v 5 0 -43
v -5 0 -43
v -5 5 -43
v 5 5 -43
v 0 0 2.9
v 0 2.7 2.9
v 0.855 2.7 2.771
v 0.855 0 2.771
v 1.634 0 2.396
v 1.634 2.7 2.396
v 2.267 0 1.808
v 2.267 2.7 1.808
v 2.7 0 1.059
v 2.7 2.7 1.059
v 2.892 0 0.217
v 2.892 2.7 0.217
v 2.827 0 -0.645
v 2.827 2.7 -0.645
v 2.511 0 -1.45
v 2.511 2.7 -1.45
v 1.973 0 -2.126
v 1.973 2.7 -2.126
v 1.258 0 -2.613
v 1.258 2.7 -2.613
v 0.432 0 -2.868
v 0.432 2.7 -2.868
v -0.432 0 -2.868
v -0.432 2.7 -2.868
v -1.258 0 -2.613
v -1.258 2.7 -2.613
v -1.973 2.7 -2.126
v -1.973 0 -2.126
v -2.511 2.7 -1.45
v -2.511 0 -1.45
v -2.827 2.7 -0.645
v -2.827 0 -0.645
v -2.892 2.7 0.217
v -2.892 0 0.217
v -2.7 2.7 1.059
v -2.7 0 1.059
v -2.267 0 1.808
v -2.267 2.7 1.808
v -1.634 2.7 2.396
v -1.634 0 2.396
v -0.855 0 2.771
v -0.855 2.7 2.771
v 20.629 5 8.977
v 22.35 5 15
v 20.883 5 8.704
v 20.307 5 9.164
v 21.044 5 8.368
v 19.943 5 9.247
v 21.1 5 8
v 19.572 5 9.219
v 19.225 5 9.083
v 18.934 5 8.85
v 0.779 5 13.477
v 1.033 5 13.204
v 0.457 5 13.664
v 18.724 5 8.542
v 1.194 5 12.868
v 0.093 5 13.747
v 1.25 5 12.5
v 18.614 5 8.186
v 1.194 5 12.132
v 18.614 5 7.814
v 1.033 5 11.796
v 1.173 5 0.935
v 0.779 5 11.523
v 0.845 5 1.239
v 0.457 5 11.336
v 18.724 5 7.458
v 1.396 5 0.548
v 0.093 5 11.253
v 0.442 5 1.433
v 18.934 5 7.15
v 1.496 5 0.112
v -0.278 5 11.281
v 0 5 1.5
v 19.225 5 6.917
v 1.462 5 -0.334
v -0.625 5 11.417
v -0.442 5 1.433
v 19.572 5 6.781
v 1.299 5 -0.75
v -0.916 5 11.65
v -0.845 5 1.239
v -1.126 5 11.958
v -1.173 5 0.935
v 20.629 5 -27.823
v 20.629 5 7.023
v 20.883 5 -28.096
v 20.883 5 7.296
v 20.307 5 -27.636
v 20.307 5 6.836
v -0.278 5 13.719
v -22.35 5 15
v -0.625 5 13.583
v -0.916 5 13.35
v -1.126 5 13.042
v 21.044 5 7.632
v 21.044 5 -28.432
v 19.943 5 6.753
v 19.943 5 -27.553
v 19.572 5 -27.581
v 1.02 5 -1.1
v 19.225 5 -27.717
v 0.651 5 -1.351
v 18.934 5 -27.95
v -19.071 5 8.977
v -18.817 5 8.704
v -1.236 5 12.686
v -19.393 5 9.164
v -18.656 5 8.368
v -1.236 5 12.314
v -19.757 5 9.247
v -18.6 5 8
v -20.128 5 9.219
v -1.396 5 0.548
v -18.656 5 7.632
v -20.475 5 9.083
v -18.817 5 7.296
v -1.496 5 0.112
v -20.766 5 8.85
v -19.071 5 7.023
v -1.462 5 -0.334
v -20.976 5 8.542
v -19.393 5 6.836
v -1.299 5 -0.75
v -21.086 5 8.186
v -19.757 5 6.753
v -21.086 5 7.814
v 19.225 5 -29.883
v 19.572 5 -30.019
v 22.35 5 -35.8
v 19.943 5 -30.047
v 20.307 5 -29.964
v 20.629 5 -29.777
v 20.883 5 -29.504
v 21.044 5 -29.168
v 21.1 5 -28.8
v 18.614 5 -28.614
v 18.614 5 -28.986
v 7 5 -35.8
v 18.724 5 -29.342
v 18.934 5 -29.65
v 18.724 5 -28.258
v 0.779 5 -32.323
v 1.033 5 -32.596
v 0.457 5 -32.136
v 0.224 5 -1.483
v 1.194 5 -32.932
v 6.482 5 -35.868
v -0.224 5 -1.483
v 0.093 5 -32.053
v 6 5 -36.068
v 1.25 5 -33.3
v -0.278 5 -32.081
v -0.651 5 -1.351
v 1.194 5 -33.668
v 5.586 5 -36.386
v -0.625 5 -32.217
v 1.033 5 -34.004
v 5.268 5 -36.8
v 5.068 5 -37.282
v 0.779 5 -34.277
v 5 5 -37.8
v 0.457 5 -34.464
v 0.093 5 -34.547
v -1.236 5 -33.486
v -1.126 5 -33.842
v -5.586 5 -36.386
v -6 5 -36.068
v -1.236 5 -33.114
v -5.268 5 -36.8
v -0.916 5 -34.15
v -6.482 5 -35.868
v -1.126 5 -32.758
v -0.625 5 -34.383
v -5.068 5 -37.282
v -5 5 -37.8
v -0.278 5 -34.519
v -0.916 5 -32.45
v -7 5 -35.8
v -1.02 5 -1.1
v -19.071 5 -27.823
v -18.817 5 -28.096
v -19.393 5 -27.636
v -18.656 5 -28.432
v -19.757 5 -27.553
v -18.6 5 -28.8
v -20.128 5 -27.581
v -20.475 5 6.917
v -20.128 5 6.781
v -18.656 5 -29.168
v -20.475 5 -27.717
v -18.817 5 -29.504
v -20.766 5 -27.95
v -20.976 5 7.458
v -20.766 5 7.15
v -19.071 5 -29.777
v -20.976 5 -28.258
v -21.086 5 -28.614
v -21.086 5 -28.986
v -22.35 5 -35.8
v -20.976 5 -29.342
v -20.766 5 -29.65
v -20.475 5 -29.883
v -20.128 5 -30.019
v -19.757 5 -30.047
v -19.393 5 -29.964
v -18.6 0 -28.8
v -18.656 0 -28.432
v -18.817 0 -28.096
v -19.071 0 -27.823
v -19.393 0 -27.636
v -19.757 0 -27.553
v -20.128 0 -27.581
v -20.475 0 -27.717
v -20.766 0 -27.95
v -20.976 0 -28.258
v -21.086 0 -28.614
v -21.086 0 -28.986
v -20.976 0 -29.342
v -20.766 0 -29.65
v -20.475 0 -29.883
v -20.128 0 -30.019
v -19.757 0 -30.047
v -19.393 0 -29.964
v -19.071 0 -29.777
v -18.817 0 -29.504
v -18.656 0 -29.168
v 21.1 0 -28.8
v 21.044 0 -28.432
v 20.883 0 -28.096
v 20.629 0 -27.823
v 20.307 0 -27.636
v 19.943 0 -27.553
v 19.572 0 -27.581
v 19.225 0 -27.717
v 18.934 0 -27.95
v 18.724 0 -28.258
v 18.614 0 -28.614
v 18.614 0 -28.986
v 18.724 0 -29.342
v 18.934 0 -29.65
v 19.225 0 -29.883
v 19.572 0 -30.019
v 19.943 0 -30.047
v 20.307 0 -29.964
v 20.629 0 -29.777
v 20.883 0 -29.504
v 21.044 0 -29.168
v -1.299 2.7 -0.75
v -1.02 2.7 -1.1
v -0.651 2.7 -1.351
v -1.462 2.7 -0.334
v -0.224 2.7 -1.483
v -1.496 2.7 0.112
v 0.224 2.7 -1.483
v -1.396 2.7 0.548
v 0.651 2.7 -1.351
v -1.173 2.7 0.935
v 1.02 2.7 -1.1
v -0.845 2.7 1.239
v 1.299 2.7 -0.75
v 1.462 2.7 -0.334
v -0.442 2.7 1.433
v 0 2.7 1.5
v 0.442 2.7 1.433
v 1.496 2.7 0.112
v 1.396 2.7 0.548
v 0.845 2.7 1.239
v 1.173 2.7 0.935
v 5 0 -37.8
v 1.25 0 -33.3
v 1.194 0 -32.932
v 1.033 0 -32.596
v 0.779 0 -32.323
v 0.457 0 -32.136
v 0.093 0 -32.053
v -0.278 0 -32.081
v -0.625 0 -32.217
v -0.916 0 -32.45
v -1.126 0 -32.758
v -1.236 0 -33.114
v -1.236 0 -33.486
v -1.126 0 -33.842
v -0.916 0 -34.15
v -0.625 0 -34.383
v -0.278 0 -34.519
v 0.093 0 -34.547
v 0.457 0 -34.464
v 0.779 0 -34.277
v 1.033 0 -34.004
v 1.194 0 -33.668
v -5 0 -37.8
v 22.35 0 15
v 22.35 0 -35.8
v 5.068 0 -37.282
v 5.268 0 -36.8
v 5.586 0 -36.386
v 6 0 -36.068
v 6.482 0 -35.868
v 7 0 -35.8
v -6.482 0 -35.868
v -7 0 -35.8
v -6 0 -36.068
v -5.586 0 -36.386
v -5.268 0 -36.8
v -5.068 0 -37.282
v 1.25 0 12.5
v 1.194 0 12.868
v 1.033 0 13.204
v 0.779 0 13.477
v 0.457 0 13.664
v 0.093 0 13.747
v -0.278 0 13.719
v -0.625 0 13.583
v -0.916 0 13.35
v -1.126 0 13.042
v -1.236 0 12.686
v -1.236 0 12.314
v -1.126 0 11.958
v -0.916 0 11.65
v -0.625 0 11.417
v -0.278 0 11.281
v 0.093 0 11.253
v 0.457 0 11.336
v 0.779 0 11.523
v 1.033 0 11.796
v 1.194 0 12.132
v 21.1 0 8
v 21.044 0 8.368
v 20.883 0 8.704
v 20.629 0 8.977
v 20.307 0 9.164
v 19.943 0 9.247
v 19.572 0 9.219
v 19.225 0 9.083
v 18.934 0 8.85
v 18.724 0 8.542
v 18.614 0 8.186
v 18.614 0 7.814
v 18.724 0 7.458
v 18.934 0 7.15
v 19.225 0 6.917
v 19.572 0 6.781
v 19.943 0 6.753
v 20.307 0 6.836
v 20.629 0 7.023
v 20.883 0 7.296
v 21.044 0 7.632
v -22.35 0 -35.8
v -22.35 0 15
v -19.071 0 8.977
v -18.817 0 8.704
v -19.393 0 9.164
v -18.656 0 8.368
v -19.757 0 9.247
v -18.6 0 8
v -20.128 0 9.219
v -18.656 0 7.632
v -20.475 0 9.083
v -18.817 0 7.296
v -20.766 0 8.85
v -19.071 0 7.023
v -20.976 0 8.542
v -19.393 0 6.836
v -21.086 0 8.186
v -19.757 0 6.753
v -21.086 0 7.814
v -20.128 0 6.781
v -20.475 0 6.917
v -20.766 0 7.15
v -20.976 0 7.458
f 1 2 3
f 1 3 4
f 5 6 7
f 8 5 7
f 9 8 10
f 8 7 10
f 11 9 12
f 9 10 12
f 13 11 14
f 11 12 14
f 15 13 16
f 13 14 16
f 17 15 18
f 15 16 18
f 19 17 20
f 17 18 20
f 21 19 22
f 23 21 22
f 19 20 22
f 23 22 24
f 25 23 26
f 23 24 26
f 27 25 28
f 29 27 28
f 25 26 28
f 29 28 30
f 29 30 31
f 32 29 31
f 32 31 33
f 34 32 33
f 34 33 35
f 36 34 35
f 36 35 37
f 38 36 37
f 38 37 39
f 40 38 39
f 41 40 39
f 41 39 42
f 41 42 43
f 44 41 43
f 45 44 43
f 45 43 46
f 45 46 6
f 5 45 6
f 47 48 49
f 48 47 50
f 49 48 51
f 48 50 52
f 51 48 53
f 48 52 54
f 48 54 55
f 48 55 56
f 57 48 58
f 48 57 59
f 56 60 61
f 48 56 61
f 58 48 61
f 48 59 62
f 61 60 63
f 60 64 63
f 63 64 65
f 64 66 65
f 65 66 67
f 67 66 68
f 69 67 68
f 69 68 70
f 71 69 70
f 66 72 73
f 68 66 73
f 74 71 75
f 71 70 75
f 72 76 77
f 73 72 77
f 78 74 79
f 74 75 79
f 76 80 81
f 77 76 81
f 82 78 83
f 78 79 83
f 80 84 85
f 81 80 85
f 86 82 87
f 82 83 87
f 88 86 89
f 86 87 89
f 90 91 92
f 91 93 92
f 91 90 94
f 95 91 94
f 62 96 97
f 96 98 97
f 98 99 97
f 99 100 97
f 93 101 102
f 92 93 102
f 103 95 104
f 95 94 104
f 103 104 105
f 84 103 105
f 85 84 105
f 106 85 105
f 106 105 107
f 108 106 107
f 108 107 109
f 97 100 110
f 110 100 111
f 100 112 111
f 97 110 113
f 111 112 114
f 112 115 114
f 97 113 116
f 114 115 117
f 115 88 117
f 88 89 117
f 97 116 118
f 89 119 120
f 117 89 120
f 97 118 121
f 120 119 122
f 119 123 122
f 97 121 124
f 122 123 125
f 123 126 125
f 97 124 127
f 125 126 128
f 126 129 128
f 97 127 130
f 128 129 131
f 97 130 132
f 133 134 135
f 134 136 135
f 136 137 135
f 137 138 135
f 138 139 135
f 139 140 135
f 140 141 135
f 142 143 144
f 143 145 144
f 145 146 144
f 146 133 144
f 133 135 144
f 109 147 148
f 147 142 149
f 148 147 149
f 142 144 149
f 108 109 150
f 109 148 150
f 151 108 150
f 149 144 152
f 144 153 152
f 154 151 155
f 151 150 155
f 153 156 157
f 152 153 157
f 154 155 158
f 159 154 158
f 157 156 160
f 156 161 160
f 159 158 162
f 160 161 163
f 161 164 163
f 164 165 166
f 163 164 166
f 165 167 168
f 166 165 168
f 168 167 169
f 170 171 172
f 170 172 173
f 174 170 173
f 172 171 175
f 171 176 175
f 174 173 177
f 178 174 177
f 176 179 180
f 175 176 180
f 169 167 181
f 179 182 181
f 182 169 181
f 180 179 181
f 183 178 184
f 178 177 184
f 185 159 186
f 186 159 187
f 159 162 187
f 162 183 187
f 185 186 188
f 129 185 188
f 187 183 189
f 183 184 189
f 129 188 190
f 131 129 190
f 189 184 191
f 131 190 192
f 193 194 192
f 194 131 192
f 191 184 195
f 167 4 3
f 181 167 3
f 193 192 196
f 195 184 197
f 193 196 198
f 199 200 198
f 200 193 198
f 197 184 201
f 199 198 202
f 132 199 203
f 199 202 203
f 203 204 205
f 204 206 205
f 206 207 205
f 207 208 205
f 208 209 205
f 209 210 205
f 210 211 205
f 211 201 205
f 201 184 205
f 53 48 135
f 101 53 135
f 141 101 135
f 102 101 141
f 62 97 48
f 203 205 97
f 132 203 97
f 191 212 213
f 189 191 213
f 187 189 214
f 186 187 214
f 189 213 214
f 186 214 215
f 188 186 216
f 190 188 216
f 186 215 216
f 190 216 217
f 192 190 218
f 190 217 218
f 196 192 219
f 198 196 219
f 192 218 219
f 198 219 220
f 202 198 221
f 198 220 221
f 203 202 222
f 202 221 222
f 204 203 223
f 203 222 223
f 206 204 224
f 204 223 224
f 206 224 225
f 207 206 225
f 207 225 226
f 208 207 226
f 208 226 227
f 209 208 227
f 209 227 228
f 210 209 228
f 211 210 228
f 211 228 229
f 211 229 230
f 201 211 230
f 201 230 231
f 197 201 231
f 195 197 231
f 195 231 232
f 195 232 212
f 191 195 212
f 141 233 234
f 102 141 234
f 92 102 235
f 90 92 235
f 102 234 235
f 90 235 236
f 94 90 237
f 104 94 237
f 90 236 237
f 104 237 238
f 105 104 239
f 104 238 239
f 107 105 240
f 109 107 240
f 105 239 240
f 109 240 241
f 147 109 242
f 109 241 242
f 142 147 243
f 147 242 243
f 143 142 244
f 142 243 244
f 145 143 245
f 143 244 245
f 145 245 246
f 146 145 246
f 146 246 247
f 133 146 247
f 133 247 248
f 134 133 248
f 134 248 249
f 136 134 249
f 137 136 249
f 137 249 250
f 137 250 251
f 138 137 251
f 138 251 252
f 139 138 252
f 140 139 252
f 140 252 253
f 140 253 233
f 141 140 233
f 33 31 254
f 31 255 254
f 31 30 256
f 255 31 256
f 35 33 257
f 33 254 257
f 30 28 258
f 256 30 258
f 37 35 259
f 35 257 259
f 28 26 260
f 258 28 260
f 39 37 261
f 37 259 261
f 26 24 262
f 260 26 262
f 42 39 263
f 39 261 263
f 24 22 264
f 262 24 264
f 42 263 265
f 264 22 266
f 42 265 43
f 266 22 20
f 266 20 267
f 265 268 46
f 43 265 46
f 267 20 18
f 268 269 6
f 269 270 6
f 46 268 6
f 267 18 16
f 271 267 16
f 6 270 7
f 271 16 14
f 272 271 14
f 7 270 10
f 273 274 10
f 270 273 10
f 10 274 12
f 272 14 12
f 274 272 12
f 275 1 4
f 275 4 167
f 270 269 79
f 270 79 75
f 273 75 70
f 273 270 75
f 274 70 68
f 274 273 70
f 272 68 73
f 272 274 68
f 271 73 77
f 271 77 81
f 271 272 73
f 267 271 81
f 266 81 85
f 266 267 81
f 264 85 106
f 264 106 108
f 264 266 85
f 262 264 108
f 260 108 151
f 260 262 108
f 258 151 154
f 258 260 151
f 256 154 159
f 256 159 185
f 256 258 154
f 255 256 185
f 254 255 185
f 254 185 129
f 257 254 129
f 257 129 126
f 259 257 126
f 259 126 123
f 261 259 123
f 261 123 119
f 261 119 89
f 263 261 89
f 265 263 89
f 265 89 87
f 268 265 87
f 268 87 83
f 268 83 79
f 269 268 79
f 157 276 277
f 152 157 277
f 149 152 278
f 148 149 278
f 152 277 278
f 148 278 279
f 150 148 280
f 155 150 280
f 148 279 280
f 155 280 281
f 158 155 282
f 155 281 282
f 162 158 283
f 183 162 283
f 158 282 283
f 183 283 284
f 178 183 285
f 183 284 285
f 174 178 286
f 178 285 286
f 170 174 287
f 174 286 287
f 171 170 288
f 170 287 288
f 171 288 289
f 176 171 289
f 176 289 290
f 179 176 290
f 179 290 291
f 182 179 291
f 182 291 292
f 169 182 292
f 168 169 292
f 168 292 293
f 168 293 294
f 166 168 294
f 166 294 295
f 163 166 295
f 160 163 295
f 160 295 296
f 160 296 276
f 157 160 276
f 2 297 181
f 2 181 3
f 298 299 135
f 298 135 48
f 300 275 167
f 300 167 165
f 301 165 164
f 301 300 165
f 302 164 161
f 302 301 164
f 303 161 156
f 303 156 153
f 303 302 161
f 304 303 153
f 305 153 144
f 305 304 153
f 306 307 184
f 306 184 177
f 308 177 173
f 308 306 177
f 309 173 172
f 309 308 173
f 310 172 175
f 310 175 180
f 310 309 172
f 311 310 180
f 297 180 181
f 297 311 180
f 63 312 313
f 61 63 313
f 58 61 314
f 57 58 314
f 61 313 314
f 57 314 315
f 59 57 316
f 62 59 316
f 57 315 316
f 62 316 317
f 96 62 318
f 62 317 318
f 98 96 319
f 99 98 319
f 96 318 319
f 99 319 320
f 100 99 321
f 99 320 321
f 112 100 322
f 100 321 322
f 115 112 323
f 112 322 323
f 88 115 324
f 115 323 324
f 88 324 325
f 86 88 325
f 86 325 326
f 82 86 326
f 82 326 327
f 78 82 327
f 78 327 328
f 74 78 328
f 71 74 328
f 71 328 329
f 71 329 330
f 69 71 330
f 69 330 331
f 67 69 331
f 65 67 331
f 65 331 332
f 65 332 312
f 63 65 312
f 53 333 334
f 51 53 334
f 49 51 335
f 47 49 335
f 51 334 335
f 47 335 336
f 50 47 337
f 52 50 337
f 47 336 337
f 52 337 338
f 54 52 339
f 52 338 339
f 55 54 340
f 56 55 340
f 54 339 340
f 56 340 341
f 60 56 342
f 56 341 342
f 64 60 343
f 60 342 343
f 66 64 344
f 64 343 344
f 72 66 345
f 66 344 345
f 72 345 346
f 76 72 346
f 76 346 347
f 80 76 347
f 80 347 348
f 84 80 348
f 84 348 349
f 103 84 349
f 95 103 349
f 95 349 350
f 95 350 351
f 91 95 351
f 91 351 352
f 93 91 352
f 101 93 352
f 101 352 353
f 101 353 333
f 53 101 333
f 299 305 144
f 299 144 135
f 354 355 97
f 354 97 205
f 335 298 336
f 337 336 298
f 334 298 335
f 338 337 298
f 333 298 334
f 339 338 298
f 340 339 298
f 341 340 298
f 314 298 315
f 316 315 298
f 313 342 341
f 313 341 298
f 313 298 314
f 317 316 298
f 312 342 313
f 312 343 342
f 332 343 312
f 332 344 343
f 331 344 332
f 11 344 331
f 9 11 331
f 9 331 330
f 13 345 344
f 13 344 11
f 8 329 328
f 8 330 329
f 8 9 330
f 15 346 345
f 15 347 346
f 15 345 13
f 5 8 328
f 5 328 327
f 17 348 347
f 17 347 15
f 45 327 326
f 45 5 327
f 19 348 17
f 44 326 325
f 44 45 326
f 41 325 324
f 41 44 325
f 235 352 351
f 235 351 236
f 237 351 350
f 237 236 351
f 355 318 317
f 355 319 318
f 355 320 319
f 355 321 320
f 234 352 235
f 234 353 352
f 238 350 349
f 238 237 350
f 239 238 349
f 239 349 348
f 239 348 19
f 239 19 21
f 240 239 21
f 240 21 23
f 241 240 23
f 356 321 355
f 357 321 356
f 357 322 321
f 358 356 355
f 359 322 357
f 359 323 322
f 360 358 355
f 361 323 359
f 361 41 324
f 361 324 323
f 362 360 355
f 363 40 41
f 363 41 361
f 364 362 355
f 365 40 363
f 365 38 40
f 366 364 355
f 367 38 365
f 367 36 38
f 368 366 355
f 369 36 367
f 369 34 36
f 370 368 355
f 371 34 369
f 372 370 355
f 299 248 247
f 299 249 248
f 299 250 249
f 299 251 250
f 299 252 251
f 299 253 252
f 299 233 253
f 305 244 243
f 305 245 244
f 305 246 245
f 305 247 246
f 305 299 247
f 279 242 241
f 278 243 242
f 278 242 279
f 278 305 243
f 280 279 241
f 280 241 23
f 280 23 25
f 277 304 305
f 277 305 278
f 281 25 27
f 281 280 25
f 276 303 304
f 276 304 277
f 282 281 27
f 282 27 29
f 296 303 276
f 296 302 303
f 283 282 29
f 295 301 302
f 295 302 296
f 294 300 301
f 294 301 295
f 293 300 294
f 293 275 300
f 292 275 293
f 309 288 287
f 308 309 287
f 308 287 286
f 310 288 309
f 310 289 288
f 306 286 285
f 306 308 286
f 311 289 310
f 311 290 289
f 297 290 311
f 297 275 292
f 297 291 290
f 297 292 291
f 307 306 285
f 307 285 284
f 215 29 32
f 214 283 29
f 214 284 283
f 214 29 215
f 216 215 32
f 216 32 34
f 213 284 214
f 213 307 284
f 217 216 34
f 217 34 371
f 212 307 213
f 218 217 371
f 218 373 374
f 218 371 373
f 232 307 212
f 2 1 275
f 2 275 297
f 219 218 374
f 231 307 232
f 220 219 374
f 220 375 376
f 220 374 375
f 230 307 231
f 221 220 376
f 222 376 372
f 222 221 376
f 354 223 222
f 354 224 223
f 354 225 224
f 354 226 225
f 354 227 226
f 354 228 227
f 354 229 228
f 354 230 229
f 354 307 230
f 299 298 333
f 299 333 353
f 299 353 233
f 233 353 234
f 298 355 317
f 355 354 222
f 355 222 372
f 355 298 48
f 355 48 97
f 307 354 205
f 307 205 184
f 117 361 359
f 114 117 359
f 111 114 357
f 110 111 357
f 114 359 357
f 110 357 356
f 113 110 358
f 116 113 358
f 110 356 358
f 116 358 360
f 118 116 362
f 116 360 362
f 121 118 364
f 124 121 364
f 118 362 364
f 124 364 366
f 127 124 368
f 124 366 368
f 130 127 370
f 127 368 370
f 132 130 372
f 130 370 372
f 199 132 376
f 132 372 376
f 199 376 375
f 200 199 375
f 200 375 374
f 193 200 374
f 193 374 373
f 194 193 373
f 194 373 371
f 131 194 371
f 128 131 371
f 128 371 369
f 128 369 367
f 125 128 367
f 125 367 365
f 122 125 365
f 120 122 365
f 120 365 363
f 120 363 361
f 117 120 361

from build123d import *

# Parameters (mm, degrees)
ESQUISSE1_R             = 1.5
EXTRUSION1_DEPTH        = 5
TROU_TARAUD_M3X0_51_D   = 2.5
ESQUISSE6_R             = 2.9
ENL_V_MAT_EXTRU_3_DEPTH = 49.536712909


with BuildPart() as part:
    # Esquisse1 → Extrusion1 (new body)
    with BuildSketch(Plane(origin=(0, 0, 0), x_dir=(1, 0, 0), z_dir=(0, 1, 0))):
        with BuildLine():
            Line((-22.35, 35.8), (-7, 35.8))
            ThreePointArc((-7, 35.8), (-5.585786438, 36.385786438), (-5, 37.8))
            Line((-5, 37.8), (-5, 43))
            Line((-5, 43), (5, 43))
            Line((5, 43), (5, 37.8))
            ThreePointArc((5, 37.8), (5.585786438, 36.385786438), (7, 35.8))
            Line((7, 35.8), (22.35, 35.8))
            Line((22.35, 35.8), (22.35, -15))
            Line((22.35, -15), (-22.35, -15))
            Line((-22.35, -15), (-22.35, 35.8))
        make_face()
        Circle(ESQUISSE1_R, mode=Mode.SUBTRACT)
    extrude(amount=EXTRUSION1_DEPTH)

    # Trou taraudé M3x0.51 (through all)
    with Locations(Plane(origin=(0, 5, 0), x_dir=(-1, 0, 0), z_dir=(0, 1, 0))):
        with Locations((0, -33.3), (-19.85, -28.8), (-19.85, 8), (0, 12.5), (19.85, -28.8), (19.85, 8)):
            Hole(TROU_TARAUD_M3X0_51_D / 2)

    # Esquisse6 → Enlèv. mat.-Extru.3 (cut, through all)
    with BuildSketch(Plane(origin=(0, 2.7, 0), x_dir=(1, 0, 0), z_dir=(0, 1, 0))):
        Circle(ESQUISSE6_R)
    extrude(amount=-ENL_V_MAT_EXTRU_3_DEPTH, mode=Mode.SUBTRACT)


solid = part.part
